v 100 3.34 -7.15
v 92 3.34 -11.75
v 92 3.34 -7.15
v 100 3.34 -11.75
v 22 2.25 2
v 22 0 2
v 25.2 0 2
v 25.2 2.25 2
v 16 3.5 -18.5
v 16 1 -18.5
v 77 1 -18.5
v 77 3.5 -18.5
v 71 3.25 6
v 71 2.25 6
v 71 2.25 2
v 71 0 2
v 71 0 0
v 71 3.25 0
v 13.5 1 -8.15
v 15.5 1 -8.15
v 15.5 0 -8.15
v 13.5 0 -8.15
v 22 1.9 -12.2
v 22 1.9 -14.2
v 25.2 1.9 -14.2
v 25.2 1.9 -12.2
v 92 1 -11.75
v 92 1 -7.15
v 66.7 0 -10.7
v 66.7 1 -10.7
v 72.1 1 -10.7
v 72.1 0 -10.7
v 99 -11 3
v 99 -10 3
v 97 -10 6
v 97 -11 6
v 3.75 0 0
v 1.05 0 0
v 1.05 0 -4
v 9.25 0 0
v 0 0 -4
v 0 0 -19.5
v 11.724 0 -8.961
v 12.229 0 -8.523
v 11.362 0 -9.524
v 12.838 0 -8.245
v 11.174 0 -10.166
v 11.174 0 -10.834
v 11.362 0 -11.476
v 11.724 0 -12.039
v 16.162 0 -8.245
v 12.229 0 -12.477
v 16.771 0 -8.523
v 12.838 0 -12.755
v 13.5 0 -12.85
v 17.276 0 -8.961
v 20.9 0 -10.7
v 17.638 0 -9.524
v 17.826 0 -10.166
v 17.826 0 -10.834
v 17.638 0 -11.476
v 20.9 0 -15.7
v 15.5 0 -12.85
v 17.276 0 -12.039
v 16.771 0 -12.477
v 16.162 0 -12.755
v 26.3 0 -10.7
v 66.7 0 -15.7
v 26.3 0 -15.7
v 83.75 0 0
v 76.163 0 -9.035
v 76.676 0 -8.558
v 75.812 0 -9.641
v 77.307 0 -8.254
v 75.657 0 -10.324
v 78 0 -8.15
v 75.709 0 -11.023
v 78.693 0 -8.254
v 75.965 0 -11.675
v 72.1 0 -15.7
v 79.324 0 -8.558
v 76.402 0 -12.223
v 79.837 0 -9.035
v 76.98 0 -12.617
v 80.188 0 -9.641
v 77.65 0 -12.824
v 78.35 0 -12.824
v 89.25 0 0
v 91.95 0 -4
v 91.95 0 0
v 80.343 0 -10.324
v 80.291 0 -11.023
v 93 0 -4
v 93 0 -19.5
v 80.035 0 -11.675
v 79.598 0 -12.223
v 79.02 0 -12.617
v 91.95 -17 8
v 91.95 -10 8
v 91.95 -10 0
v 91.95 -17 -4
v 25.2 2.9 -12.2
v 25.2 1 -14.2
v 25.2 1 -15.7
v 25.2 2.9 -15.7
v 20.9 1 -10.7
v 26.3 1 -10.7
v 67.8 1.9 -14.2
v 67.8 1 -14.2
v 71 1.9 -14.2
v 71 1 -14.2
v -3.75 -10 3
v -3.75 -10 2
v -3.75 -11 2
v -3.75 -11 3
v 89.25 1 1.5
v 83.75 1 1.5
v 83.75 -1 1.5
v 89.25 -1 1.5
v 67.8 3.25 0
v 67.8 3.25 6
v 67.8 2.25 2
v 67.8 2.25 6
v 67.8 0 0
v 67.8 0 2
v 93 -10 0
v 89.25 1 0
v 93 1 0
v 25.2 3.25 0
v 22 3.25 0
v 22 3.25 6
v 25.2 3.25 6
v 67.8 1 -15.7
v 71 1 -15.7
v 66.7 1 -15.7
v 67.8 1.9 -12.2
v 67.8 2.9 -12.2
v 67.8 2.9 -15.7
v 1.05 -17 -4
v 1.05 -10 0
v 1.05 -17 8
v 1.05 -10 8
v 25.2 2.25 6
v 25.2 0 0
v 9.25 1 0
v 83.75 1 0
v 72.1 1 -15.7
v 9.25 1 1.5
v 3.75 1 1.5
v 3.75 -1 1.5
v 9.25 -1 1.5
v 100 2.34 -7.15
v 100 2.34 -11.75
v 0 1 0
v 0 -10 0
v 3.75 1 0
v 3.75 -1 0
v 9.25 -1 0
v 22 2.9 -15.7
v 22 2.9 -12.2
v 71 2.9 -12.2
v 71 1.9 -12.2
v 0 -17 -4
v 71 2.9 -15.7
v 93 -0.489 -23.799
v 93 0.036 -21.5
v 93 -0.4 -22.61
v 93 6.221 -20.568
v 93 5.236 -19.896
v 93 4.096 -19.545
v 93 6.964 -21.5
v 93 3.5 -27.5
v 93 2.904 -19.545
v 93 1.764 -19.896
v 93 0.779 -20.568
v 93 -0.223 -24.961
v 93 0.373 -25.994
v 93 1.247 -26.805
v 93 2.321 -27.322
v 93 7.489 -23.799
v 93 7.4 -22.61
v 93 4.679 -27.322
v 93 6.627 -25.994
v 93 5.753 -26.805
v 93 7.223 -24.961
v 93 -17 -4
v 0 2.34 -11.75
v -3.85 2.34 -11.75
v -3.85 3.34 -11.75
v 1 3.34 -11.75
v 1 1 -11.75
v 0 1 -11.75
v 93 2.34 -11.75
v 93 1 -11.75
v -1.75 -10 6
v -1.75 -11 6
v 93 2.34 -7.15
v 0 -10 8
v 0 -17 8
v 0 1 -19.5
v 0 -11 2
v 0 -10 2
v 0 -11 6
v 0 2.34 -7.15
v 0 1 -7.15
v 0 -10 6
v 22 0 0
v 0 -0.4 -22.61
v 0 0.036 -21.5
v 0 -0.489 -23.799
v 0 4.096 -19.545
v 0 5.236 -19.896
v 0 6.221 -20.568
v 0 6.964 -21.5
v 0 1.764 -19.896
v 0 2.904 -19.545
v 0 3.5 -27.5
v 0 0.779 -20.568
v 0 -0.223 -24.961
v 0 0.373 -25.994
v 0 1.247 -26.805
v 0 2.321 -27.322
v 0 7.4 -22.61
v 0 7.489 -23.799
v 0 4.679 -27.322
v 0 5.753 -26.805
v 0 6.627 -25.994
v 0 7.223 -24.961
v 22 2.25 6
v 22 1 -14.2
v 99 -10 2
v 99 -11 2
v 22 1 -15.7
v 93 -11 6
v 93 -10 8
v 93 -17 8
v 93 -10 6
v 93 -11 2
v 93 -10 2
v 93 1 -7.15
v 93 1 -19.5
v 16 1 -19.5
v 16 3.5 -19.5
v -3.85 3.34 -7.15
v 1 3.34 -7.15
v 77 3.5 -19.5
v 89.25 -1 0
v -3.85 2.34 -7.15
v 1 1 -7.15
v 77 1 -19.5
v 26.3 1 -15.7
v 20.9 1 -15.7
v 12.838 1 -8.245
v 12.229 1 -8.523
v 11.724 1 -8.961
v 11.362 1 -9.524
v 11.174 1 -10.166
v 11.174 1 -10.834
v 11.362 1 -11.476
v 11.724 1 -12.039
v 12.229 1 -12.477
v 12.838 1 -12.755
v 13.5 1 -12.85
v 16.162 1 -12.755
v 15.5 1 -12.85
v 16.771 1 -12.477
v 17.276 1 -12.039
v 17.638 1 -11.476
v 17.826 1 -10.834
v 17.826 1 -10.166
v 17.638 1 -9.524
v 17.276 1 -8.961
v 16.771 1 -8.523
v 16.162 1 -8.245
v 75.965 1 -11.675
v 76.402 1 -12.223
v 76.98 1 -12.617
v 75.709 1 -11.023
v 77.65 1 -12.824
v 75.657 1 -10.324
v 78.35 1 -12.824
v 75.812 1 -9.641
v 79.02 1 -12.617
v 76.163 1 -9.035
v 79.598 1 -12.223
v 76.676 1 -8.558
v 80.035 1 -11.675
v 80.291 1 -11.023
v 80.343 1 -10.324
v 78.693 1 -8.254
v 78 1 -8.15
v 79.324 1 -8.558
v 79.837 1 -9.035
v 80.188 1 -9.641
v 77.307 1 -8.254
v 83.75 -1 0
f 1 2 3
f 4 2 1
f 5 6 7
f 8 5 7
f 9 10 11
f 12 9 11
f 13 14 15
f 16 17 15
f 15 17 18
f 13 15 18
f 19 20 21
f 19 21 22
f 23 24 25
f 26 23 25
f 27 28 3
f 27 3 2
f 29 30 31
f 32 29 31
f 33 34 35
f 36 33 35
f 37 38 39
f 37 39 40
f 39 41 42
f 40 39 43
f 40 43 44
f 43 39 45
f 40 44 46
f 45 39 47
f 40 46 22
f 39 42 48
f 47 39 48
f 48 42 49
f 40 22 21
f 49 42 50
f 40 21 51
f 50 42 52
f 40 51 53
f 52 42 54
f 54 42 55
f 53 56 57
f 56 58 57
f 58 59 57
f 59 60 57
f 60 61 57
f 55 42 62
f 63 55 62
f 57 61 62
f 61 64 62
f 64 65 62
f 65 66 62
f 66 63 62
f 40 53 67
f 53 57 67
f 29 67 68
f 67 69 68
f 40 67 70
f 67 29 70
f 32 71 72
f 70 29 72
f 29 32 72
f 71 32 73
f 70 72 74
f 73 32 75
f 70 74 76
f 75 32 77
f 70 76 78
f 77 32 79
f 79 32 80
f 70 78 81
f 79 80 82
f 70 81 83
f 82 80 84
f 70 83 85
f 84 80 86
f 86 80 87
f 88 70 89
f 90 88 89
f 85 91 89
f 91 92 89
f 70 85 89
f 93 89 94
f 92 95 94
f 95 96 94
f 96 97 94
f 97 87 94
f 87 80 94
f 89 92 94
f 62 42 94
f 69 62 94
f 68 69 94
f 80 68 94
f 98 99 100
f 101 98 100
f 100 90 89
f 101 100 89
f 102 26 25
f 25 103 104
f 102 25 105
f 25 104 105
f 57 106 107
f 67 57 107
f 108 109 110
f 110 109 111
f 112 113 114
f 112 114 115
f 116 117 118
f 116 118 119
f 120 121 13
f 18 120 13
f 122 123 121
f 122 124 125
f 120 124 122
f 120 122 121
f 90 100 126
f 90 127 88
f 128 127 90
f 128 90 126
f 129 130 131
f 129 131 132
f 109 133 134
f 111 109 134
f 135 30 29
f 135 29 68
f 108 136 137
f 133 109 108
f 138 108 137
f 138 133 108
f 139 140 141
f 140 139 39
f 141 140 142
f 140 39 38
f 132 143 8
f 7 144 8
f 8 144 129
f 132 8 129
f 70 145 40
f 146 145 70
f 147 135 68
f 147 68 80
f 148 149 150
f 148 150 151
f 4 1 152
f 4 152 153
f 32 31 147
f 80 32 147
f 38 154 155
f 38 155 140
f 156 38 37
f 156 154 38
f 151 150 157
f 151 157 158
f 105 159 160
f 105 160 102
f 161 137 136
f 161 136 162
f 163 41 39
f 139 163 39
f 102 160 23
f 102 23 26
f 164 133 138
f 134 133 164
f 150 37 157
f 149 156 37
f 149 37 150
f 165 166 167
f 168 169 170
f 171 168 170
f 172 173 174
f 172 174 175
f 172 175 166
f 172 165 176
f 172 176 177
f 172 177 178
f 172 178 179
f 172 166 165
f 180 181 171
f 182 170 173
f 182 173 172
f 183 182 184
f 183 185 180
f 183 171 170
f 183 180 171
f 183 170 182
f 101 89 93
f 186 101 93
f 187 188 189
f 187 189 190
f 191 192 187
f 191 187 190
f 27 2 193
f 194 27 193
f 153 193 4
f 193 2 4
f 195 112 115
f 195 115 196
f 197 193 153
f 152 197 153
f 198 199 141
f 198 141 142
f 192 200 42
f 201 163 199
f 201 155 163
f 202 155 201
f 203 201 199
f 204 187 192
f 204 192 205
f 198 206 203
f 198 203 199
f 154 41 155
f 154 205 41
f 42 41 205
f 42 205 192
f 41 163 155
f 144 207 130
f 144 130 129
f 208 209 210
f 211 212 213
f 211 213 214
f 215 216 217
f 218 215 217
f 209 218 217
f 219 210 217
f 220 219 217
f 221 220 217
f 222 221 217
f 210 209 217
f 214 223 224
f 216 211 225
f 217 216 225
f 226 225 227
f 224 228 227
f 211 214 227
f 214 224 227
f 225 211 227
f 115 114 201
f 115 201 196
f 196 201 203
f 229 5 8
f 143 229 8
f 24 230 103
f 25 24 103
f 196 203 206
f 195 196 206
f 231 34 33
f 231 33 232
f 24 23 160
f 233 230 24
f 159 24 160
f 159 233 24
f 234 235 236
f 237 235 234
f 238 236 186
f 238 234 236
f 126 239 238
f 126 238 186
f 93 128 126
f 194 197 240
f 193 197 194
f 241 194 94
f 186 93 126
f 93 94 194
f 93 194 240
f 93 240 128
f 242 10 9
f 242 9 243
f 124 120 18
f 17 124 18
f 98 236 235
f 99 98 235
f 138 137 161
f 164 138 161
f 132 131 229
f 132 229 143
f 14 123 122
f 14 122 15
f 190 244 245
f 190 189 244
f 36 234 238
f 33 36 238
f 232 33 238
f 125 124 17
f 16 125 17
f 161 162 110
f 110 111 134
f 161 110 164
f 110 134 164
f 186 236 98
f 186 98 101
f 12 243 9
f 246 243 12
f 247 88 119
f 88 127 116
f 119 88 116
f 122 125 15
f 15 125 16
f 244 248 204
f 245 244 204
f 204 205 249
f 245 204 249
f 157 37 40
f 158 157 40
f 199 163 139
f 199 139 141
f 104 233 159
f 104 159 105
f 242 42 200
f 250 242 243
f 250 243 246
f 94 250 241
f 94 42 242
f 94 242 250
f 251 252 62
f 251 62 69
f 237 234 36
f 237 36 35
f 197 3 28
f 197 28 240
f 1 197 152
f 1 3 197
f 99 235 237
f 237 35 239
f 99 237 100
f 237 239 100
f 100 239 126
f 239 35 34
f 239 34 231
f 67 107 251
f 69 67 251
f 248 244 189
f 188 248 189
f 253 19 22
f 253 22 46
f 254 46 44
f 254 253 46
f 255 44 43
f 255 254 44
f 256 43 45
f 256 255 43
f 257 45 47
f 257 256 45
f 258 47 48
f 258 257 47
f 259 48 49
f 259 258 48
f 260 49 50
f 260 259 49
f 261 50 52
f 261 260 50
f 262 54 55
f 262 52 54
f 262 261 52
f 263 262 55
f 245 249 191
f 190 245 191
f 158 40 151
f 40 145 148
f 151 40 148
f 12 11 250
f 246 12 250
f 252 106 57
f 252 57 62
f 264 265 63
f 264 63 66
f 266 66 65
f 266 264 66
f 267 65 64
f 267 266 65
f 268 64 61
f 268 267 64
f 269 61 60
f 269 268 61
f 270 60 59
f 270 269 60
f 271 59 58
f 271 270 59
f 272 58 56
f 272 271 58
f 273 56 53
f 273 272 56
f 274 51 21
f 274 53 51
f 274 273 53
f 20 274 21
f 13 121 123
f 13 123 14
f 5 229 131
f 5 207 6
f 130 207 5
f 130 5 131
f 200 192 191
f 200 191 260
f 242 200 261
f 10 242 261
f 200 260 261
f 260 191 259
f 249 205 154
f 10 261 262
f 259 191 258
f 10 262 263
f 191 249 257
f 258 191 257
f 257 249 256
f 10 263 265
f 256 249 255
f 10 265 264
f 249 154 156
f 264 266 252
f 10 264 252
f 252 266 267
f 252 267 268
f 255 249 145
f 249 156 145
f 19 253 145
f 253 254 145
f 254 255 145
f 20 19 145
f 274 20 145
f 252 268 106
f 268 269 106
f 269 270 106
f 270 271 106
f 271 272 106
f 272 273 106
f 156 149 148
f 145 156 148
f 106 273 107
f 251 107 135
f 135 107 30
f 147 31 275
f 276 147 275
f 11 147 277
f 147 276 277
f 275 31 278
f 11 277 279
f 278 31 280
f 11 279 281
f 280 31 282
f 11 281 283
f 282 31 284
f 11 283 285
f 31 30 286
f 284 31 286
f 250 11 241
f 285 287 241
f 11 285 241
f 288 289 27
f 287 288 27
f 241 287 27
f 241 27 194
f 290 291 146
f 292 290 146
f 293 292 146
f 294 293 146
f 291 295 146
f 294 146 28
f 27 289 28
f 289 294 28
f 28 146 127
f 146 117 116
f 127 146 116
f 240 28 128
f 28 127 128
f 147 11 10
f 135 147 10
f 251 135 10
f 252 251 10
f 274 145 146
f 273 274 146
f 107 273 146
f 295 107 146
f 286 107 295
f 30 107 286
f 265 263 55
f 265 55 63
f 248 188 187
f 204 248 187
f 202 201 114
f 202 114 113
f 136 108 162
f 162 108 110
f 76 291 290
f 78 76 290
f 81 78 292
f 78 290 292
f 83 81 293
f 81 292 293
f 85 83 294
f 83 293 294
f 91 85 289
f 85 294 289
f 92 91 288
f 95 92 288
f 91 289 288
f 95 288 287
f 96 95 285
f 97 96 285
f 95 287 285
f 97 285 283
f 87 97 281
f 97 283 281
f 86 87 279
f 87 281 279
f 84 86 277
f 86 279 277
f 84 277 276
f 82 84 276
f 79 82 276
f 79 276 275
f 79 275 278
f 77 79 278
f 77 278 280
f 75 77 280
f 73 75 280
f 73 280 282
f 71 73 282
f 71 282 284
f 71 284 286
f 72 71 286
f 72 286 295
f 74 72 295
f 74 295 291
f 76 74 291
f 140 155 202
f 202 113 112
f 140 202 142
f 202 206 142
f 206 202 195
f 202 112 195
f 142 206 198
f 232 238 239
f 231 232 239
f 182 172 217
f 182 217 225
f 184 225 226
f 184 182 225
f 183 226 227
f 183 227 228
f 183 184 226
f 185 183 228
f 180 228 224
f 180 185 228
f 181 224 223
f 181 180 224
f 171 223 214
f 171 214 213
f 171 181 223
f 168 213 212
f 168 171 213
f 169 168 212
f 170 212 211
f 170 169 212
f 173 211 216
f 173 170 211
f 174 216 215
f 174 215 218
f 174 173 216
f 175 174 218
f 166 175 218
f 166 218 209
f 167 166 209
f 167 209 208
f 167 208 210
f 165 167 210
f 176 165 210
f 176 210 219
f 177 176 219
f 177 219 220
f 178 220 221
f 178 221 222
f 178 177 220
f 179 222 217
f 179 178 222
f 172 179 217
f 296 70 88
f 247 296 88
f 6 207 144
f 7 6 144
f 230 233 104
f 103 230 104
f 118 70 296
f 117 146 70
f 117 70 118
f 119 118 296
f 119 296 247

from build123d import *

# Parameters (mm, degrees)
SKETCH_1_W             = 93
SKETCH_1_H             = 19.5
EXTRUDE_1_DEPTH        = 1
SKETCH_2_W             = 61
SKETCH_2_H             = 1
EXTRUDE_2_DEPTH        = 2.5
EXTRUDE_3_DEPTH        = 2.25
EXTRUDE_3_DEPTH_BACK   = 1
SKETCH_3_W             = 3.2
SKETCH_3_H             = 2
EXTRUDE_3_2_DEPTH      = 2.25
EXTRUDE_3_2_DEPTH_BACK = 1
SKETCH_4_W             = 3.2
SKETCH_4_H             = 1
EXTRUDE_4_DEPTH        = 4
SKETCH_5_W             = 5.4
SKETCH_5_H             = 5
CUT_EXTRUDE_1_DEPTH    = 5
SKETCH_6_W             = 3.2
SKETCH_6_H             = 1.5
EXTRUDE_5_DEPTH        = 1.9
EXTRUDE_5_2_DEPTH      = 1.9
SKETCH_7_W             = 3.2
SKETCH_7_H             = 1
EXTRUDE_6_DEPTH        = 2
SKETCH_8_R             = 2.35
CUT_EXTRUDE_2_DEPTH    = 96.055247093
SKETCH_9_R             = 4
EXTRUDE_7_DEPTH        = 93
SKETCH_10_W            = 1
SKETCH_10_H            = 4.6
EXTRUDE_8_DEPTH        = 2.34
SKETCH_11_W            = 7
SKETCH_11_H            = 4.6
SKETCH_11_W_2          = 3.85
EXTRUDE_9_DEPTH        = 1
SKETCH_12_W            = 1.05
SKETCH_12_H            = 17
EXTRUDE_10_DEPTH       = 4
EXTRUDE_11_DEPTH       = 1
EXTRUDE_11_DEPTH_BACK  = 1
SKETCH_13_W            = 5.5
SKETCH_13_H            = 1.5
SKETCH_14_W            = 8
SKETCH_14_H            = 7
EXTRUDE_12_DEPTH       = 1.05
SKETCH_15_W            = 4
SKETCH_15_H            = 1
EXTRUDE_13_DEPTH       = 6
CUT_EXTRUDE_3_DEPTH    = 6
SKETCH_17_W            = 8
SKETCH_17_H            = 7
EXTRUDE_14_DEPTH       = 1.05
SKETCH_18_W            = 4
SKETCH_18_H            = 1
EXTRUDE_15_DEPTH       = 3.75
CUT_EXTRUDE_4_DEPTH    = 3.75


with BuildPart() as part:
    # 草图1 → 凸台-拉伸1 (new body)
    with BuildSketch(Plane(origin=(0, 0, 0), x_dir=(1, 0, 0), z_dir=(0, 1, 0))):
        with Locations((46.5, 9.75)):
            Rectangle(SKETCH_1_W, SKETCH_1_H)
    extrude(amount=EXTRUDE_1_DEPTH)

    # 草图2 → 凸台-拉伸2 (add)
    with BuildSketch(Plane(origin=(0, 1, 0), x_dir=(1, 0, 0), z_dir=(0, 1, 0))):
        with Locations((46.5, 19)):
            Rectangle(SKETCH_2_W, SKETCH_2_H)
    extrude(amount=EXTRUDE_2_DEPTH)

    # 草图5 → 切除-拉伸1 (cut)
    with BuildSketch(Plane(origin=(0, 1, 0), x_dir=(1, 0, 0), z_dir=(0, 1, 0))):
        with Locations((23.6, 13.2)):
            Rectangle(SKETCH_5_W, SKETCH_5_H)
        with Locations((69.4, 13.2)):
            Rectangle(SKETCH_5_W, SKETCH_5_H)
    extrude(amount=-CUT_EXTRUDE_1_DEPTH, mode=Mode.SUBTRACT)

    # 草图8 → 切除-拉伸2 (cut, through all)
    with BuildSketch(Plane(origin=(0, 1, 0), x_dir=(1, 0, 0), z_dir=(0, 1, 0))):
        with Locations(Location((78, 10.5, 0), (0, 0, 270))):
            Circle(SKETCH_8_R)
        with BuildLine():
            Line((13.5, 12.85), (15.5, 12.85))
            ThreePointArc((15.5, 12.85), (17.85, 10.5), (15.5, 8.15))
            Line((15.5, 8.15), (13.5, 8.15))
            ThreePointArc((13.5, 8.15), (11.15, 10.5), (13.5, 12.85))
        make_face()
    extrude(amount=-CUT_EXTRUDE_2_DEPTH, mode=Mode.SUBTRACT)

    # 草图10 → 凸台-拉伸8 (add)
    with BuildSketch(Plane(origin=(0, 1, 0), x_dir=(1, 0, 0), z_dir=(0, 1, 0))):
        with Locations((92.5, 9.45)):
            Rectangle(SKETCH_10_W, SKETCH_10_H)
        with Locations((0.5, 9.45)):
            Rectangle(SKETCH_10_W, SKETCH_10_H)
    extrude(amount=EXTRUDE_8_DEPTH)

    # 草图11 → 凸台-拉伸9 (add)
    with BuildSketch(Plane(origin=(0, 3.34, 0), x_dir=(1, 0, 0), z_dir=(0, 1, 0))):
        with Locations((96.5, 9.45)):
            Rectangle(SKETCH_11_W, SKETCH_11_H)
        with Locations((-1.925, 9.45)):
            Rectangle(SKETCH_11_W_2, SKETCH_11_H)
    extrude(amount=-EXTRUDE_9_DEPTH)

    # 草图12 → 凸台-拉伸10 (add)
    with BuildSketch(Plane.XY):
        with Locations((92.475, -8.5)):
            Rectangle(SKETCH_12_W, SKETCH_12_H)
        with Locations((0.525, -8.5)):
            Rectangle(SKETCH_12_W, SKETCH_12_H)
    extrude(amount=-EXTRUDE_10_DEPTH)

    # 草图13 → 凸台-拉伸11 (add, two sides: drawn at the far end of the back side and taken through both)
    with BuildSketch(Plane.XZ.offset(-EXTRUDE_11_DEPTH_BACK)):
        with Locations((6.5, 0.75)):
            Rectangle(SKETCH_13_W, SKETCH_13_H)
        with Locations((86.5, 0.75)):
            Rectangle(SKETCH_13_W, SKETCH_13_H)
    extrude(amount=EXTRUDE_11_DEPTH + EXTRUDE_11_DEPTH_BACK)

    # 草图14 → 凸台-拉伸12 (add)
    with BuildSketch(Plane(origin=(93, 0, 0), x_dir=(0, 0, -1), z_dir=(1, 0, 0))):
        with Locations((-4, -13.5)):
            Rectangle(SKETCH_14_W, SKETCH_14_H)
    extrude(amount=-EXTRUDE_12_DEPTH)

    # 草图15 → 凸台-拉伸13 (add)
    with BuildSketch(Plane(origin=(93, 0, 0), x_dir=(0, 0, -1), z_dir=(1, 0, 0))):
        with Locations((-4, -10.5)):
            Rectangle(SKETCH_15_W, SKETCH_15_H)
    extrude(amount=EXTRUDE_13_DEPTH)

    # 草图16 → 切除-拉伸3 (cut)
    with BuildSketch(Plane(origin=(0, -10, 0), x_dir=(1, 0, 0), z_dir=(0, 1, 0))):
        Polygon((99, -3), (97, -6), (99, -6), align=None)
    extrude(amount=-CUT_EXTRUDE_3_DEPTH, mode=Mode.SUBTRACT)

    # 草图17 → 凸台-拉伸14 (add)
    with BuildSketch(Plane.ZY):
        with Locations((4, -13.5)):
            Rectangle(SKETCH_17_W, SKETCH_17_H)
    extrude(amount=-EXTRUDE_14_DEPTH)

    # 草图18 → 凸台-拉伸15 (add)
    with BuildSketch(Plane.ZY):
        with Locations((4, -10.5)):
            Rectangle(SKETCH_18_W, SKETCH_18_H)
    extrude(amount=EXTRUDE_15_DEPTH)

    # 草图19 → 切除-拉伸4 (cut)
    with BuildSketch(Plane(origin=(0, -10, 0), x_dir=(1, 0, 0), z_dir=(0, 1, 0))):
        Polygon((-3.75, -3), (-1.75, -6), (-3.75, -6), align=None)
    extrude(amount=-CUT_EXTRUDE_4_DEPTH, mode=Mode.SUBTRACT)


with BuildPart() as body_2:
    # 草图3 → 凸台-拉伸3 (new, two sides: drawn at the far end of the back side and taken through both)
    with BuildSketch(Plane(origin=(0, 1, 0), x_dir=(1, 0, 0), z_dir=(0, 1, 0)).offset(-EXTRUDE_3_DEPTH_BACK)):
        with Locations((69.4, -1)):
            Rectangle(SKETCH_3_W, SKETCH_3_H)
    extrude(amount=EXTRUDE_3_DEPTH + EXTRUDE_3_DEPTH_BACK)



with BuildPart() as body_3:
    # 草图3 → Extrude 3 2 (new, two sides: drawn at the far end of the back side and taken through both)
    with BuildSketch(Plane(origin=(0, 1, 0), x_dir=(1, 0, 0), z_dir=(0, 1, 0)).offset(-EXTRUDE_3_2_DEPTH_BACK)):
        with Locations((23.6, -1)):
            Rectangle(SKETCH_3_W, SKETCH_3_H)
    extrude(amount=EXTRUDE_3_2_DEPTH + EXTRUDE_3_2_DEPTH_BACK)


with BuildPart() as body_2_1:
    add(body_2.part)

    add(body_3.part)  # 凸台-拉伸4 merges body 3
    # 草图4 → 凸台-拉伸4 (add)
    with BuildSketch(Plane.XY.offset(2)):
        with Locations((23.6, 2.75)):
            Rectangle(SKETCH_4_W, SKETCH_4_H)
        with Locations((69.4, 2.75)):
            Rectangle(SKETCH_4_W, SKETCH_4_H)
    extrude(amount=EXTRUDE_4_DEPTH)


with BuildPart() as body_3_2:
    # 草图6 → 凸台-拉伸5 (new body)
    with BuildSketch(Plane(origin=(0, 1, 0), x_dir=(1, 0, 0), z_dir=(0, 1, 0))):
        with Locations((23.6, 14.95)):
            Rectangle(SKETCH_6_W, SKETCH_6_H)
    extrude(amount=EXTRUDE_5_DEPTH)



with BuildPart() as body_4:
    # 草图6 → Extrude 5 2 (new body)
    with BuildSketch(Plane(origin=(0, 1, 0), x_dir=(1, 0, 0), z_dir=(0, 1, 0))):
        with Locations((69.4, 14.95)):
            Rectangle(SKETCH_6_W, SKETCH_6_H)
    extrude(amount=EXTRUDE_5_2_DEPTH)


with BuildPart() as body_3_2_1:
    add(body_3_2.part)

    add(body_4.part)  # 凸台-拉伸6 merges body 4
    # 草图7 → 凸台-拉伸6 (add)
    with BuildSketch(Plane.XY.offset(-14.2)):
        with Locations((23.6, 2.4)):
            Rectangle(SKETCH_7_W, SKETCH_7_H)
        with Locations((69.4, 2.4)):
            Rectangle(SKETCH_7_W, SKETCH_7_H)
    extrude(amount=EXTRUDE_6_DEPTH)


with BuildPart() as body_4_2:
    # 草图9 → 凸台-拉伸7 (new body)
    with BuildSketch(Plane(origin=(93, 0, 0), x_dir=(0, 0, -1), z_dir=(1, 0, 0))):
        with Locations((23.5, 3.5)):
            Circle(SKETCH_9_R)
    extrude(amount=-EXTRUDE_7_DEPTH)


solid = Compound([part.part, body_2_1.part, body_3_2_1.part, body_4_2.part])
